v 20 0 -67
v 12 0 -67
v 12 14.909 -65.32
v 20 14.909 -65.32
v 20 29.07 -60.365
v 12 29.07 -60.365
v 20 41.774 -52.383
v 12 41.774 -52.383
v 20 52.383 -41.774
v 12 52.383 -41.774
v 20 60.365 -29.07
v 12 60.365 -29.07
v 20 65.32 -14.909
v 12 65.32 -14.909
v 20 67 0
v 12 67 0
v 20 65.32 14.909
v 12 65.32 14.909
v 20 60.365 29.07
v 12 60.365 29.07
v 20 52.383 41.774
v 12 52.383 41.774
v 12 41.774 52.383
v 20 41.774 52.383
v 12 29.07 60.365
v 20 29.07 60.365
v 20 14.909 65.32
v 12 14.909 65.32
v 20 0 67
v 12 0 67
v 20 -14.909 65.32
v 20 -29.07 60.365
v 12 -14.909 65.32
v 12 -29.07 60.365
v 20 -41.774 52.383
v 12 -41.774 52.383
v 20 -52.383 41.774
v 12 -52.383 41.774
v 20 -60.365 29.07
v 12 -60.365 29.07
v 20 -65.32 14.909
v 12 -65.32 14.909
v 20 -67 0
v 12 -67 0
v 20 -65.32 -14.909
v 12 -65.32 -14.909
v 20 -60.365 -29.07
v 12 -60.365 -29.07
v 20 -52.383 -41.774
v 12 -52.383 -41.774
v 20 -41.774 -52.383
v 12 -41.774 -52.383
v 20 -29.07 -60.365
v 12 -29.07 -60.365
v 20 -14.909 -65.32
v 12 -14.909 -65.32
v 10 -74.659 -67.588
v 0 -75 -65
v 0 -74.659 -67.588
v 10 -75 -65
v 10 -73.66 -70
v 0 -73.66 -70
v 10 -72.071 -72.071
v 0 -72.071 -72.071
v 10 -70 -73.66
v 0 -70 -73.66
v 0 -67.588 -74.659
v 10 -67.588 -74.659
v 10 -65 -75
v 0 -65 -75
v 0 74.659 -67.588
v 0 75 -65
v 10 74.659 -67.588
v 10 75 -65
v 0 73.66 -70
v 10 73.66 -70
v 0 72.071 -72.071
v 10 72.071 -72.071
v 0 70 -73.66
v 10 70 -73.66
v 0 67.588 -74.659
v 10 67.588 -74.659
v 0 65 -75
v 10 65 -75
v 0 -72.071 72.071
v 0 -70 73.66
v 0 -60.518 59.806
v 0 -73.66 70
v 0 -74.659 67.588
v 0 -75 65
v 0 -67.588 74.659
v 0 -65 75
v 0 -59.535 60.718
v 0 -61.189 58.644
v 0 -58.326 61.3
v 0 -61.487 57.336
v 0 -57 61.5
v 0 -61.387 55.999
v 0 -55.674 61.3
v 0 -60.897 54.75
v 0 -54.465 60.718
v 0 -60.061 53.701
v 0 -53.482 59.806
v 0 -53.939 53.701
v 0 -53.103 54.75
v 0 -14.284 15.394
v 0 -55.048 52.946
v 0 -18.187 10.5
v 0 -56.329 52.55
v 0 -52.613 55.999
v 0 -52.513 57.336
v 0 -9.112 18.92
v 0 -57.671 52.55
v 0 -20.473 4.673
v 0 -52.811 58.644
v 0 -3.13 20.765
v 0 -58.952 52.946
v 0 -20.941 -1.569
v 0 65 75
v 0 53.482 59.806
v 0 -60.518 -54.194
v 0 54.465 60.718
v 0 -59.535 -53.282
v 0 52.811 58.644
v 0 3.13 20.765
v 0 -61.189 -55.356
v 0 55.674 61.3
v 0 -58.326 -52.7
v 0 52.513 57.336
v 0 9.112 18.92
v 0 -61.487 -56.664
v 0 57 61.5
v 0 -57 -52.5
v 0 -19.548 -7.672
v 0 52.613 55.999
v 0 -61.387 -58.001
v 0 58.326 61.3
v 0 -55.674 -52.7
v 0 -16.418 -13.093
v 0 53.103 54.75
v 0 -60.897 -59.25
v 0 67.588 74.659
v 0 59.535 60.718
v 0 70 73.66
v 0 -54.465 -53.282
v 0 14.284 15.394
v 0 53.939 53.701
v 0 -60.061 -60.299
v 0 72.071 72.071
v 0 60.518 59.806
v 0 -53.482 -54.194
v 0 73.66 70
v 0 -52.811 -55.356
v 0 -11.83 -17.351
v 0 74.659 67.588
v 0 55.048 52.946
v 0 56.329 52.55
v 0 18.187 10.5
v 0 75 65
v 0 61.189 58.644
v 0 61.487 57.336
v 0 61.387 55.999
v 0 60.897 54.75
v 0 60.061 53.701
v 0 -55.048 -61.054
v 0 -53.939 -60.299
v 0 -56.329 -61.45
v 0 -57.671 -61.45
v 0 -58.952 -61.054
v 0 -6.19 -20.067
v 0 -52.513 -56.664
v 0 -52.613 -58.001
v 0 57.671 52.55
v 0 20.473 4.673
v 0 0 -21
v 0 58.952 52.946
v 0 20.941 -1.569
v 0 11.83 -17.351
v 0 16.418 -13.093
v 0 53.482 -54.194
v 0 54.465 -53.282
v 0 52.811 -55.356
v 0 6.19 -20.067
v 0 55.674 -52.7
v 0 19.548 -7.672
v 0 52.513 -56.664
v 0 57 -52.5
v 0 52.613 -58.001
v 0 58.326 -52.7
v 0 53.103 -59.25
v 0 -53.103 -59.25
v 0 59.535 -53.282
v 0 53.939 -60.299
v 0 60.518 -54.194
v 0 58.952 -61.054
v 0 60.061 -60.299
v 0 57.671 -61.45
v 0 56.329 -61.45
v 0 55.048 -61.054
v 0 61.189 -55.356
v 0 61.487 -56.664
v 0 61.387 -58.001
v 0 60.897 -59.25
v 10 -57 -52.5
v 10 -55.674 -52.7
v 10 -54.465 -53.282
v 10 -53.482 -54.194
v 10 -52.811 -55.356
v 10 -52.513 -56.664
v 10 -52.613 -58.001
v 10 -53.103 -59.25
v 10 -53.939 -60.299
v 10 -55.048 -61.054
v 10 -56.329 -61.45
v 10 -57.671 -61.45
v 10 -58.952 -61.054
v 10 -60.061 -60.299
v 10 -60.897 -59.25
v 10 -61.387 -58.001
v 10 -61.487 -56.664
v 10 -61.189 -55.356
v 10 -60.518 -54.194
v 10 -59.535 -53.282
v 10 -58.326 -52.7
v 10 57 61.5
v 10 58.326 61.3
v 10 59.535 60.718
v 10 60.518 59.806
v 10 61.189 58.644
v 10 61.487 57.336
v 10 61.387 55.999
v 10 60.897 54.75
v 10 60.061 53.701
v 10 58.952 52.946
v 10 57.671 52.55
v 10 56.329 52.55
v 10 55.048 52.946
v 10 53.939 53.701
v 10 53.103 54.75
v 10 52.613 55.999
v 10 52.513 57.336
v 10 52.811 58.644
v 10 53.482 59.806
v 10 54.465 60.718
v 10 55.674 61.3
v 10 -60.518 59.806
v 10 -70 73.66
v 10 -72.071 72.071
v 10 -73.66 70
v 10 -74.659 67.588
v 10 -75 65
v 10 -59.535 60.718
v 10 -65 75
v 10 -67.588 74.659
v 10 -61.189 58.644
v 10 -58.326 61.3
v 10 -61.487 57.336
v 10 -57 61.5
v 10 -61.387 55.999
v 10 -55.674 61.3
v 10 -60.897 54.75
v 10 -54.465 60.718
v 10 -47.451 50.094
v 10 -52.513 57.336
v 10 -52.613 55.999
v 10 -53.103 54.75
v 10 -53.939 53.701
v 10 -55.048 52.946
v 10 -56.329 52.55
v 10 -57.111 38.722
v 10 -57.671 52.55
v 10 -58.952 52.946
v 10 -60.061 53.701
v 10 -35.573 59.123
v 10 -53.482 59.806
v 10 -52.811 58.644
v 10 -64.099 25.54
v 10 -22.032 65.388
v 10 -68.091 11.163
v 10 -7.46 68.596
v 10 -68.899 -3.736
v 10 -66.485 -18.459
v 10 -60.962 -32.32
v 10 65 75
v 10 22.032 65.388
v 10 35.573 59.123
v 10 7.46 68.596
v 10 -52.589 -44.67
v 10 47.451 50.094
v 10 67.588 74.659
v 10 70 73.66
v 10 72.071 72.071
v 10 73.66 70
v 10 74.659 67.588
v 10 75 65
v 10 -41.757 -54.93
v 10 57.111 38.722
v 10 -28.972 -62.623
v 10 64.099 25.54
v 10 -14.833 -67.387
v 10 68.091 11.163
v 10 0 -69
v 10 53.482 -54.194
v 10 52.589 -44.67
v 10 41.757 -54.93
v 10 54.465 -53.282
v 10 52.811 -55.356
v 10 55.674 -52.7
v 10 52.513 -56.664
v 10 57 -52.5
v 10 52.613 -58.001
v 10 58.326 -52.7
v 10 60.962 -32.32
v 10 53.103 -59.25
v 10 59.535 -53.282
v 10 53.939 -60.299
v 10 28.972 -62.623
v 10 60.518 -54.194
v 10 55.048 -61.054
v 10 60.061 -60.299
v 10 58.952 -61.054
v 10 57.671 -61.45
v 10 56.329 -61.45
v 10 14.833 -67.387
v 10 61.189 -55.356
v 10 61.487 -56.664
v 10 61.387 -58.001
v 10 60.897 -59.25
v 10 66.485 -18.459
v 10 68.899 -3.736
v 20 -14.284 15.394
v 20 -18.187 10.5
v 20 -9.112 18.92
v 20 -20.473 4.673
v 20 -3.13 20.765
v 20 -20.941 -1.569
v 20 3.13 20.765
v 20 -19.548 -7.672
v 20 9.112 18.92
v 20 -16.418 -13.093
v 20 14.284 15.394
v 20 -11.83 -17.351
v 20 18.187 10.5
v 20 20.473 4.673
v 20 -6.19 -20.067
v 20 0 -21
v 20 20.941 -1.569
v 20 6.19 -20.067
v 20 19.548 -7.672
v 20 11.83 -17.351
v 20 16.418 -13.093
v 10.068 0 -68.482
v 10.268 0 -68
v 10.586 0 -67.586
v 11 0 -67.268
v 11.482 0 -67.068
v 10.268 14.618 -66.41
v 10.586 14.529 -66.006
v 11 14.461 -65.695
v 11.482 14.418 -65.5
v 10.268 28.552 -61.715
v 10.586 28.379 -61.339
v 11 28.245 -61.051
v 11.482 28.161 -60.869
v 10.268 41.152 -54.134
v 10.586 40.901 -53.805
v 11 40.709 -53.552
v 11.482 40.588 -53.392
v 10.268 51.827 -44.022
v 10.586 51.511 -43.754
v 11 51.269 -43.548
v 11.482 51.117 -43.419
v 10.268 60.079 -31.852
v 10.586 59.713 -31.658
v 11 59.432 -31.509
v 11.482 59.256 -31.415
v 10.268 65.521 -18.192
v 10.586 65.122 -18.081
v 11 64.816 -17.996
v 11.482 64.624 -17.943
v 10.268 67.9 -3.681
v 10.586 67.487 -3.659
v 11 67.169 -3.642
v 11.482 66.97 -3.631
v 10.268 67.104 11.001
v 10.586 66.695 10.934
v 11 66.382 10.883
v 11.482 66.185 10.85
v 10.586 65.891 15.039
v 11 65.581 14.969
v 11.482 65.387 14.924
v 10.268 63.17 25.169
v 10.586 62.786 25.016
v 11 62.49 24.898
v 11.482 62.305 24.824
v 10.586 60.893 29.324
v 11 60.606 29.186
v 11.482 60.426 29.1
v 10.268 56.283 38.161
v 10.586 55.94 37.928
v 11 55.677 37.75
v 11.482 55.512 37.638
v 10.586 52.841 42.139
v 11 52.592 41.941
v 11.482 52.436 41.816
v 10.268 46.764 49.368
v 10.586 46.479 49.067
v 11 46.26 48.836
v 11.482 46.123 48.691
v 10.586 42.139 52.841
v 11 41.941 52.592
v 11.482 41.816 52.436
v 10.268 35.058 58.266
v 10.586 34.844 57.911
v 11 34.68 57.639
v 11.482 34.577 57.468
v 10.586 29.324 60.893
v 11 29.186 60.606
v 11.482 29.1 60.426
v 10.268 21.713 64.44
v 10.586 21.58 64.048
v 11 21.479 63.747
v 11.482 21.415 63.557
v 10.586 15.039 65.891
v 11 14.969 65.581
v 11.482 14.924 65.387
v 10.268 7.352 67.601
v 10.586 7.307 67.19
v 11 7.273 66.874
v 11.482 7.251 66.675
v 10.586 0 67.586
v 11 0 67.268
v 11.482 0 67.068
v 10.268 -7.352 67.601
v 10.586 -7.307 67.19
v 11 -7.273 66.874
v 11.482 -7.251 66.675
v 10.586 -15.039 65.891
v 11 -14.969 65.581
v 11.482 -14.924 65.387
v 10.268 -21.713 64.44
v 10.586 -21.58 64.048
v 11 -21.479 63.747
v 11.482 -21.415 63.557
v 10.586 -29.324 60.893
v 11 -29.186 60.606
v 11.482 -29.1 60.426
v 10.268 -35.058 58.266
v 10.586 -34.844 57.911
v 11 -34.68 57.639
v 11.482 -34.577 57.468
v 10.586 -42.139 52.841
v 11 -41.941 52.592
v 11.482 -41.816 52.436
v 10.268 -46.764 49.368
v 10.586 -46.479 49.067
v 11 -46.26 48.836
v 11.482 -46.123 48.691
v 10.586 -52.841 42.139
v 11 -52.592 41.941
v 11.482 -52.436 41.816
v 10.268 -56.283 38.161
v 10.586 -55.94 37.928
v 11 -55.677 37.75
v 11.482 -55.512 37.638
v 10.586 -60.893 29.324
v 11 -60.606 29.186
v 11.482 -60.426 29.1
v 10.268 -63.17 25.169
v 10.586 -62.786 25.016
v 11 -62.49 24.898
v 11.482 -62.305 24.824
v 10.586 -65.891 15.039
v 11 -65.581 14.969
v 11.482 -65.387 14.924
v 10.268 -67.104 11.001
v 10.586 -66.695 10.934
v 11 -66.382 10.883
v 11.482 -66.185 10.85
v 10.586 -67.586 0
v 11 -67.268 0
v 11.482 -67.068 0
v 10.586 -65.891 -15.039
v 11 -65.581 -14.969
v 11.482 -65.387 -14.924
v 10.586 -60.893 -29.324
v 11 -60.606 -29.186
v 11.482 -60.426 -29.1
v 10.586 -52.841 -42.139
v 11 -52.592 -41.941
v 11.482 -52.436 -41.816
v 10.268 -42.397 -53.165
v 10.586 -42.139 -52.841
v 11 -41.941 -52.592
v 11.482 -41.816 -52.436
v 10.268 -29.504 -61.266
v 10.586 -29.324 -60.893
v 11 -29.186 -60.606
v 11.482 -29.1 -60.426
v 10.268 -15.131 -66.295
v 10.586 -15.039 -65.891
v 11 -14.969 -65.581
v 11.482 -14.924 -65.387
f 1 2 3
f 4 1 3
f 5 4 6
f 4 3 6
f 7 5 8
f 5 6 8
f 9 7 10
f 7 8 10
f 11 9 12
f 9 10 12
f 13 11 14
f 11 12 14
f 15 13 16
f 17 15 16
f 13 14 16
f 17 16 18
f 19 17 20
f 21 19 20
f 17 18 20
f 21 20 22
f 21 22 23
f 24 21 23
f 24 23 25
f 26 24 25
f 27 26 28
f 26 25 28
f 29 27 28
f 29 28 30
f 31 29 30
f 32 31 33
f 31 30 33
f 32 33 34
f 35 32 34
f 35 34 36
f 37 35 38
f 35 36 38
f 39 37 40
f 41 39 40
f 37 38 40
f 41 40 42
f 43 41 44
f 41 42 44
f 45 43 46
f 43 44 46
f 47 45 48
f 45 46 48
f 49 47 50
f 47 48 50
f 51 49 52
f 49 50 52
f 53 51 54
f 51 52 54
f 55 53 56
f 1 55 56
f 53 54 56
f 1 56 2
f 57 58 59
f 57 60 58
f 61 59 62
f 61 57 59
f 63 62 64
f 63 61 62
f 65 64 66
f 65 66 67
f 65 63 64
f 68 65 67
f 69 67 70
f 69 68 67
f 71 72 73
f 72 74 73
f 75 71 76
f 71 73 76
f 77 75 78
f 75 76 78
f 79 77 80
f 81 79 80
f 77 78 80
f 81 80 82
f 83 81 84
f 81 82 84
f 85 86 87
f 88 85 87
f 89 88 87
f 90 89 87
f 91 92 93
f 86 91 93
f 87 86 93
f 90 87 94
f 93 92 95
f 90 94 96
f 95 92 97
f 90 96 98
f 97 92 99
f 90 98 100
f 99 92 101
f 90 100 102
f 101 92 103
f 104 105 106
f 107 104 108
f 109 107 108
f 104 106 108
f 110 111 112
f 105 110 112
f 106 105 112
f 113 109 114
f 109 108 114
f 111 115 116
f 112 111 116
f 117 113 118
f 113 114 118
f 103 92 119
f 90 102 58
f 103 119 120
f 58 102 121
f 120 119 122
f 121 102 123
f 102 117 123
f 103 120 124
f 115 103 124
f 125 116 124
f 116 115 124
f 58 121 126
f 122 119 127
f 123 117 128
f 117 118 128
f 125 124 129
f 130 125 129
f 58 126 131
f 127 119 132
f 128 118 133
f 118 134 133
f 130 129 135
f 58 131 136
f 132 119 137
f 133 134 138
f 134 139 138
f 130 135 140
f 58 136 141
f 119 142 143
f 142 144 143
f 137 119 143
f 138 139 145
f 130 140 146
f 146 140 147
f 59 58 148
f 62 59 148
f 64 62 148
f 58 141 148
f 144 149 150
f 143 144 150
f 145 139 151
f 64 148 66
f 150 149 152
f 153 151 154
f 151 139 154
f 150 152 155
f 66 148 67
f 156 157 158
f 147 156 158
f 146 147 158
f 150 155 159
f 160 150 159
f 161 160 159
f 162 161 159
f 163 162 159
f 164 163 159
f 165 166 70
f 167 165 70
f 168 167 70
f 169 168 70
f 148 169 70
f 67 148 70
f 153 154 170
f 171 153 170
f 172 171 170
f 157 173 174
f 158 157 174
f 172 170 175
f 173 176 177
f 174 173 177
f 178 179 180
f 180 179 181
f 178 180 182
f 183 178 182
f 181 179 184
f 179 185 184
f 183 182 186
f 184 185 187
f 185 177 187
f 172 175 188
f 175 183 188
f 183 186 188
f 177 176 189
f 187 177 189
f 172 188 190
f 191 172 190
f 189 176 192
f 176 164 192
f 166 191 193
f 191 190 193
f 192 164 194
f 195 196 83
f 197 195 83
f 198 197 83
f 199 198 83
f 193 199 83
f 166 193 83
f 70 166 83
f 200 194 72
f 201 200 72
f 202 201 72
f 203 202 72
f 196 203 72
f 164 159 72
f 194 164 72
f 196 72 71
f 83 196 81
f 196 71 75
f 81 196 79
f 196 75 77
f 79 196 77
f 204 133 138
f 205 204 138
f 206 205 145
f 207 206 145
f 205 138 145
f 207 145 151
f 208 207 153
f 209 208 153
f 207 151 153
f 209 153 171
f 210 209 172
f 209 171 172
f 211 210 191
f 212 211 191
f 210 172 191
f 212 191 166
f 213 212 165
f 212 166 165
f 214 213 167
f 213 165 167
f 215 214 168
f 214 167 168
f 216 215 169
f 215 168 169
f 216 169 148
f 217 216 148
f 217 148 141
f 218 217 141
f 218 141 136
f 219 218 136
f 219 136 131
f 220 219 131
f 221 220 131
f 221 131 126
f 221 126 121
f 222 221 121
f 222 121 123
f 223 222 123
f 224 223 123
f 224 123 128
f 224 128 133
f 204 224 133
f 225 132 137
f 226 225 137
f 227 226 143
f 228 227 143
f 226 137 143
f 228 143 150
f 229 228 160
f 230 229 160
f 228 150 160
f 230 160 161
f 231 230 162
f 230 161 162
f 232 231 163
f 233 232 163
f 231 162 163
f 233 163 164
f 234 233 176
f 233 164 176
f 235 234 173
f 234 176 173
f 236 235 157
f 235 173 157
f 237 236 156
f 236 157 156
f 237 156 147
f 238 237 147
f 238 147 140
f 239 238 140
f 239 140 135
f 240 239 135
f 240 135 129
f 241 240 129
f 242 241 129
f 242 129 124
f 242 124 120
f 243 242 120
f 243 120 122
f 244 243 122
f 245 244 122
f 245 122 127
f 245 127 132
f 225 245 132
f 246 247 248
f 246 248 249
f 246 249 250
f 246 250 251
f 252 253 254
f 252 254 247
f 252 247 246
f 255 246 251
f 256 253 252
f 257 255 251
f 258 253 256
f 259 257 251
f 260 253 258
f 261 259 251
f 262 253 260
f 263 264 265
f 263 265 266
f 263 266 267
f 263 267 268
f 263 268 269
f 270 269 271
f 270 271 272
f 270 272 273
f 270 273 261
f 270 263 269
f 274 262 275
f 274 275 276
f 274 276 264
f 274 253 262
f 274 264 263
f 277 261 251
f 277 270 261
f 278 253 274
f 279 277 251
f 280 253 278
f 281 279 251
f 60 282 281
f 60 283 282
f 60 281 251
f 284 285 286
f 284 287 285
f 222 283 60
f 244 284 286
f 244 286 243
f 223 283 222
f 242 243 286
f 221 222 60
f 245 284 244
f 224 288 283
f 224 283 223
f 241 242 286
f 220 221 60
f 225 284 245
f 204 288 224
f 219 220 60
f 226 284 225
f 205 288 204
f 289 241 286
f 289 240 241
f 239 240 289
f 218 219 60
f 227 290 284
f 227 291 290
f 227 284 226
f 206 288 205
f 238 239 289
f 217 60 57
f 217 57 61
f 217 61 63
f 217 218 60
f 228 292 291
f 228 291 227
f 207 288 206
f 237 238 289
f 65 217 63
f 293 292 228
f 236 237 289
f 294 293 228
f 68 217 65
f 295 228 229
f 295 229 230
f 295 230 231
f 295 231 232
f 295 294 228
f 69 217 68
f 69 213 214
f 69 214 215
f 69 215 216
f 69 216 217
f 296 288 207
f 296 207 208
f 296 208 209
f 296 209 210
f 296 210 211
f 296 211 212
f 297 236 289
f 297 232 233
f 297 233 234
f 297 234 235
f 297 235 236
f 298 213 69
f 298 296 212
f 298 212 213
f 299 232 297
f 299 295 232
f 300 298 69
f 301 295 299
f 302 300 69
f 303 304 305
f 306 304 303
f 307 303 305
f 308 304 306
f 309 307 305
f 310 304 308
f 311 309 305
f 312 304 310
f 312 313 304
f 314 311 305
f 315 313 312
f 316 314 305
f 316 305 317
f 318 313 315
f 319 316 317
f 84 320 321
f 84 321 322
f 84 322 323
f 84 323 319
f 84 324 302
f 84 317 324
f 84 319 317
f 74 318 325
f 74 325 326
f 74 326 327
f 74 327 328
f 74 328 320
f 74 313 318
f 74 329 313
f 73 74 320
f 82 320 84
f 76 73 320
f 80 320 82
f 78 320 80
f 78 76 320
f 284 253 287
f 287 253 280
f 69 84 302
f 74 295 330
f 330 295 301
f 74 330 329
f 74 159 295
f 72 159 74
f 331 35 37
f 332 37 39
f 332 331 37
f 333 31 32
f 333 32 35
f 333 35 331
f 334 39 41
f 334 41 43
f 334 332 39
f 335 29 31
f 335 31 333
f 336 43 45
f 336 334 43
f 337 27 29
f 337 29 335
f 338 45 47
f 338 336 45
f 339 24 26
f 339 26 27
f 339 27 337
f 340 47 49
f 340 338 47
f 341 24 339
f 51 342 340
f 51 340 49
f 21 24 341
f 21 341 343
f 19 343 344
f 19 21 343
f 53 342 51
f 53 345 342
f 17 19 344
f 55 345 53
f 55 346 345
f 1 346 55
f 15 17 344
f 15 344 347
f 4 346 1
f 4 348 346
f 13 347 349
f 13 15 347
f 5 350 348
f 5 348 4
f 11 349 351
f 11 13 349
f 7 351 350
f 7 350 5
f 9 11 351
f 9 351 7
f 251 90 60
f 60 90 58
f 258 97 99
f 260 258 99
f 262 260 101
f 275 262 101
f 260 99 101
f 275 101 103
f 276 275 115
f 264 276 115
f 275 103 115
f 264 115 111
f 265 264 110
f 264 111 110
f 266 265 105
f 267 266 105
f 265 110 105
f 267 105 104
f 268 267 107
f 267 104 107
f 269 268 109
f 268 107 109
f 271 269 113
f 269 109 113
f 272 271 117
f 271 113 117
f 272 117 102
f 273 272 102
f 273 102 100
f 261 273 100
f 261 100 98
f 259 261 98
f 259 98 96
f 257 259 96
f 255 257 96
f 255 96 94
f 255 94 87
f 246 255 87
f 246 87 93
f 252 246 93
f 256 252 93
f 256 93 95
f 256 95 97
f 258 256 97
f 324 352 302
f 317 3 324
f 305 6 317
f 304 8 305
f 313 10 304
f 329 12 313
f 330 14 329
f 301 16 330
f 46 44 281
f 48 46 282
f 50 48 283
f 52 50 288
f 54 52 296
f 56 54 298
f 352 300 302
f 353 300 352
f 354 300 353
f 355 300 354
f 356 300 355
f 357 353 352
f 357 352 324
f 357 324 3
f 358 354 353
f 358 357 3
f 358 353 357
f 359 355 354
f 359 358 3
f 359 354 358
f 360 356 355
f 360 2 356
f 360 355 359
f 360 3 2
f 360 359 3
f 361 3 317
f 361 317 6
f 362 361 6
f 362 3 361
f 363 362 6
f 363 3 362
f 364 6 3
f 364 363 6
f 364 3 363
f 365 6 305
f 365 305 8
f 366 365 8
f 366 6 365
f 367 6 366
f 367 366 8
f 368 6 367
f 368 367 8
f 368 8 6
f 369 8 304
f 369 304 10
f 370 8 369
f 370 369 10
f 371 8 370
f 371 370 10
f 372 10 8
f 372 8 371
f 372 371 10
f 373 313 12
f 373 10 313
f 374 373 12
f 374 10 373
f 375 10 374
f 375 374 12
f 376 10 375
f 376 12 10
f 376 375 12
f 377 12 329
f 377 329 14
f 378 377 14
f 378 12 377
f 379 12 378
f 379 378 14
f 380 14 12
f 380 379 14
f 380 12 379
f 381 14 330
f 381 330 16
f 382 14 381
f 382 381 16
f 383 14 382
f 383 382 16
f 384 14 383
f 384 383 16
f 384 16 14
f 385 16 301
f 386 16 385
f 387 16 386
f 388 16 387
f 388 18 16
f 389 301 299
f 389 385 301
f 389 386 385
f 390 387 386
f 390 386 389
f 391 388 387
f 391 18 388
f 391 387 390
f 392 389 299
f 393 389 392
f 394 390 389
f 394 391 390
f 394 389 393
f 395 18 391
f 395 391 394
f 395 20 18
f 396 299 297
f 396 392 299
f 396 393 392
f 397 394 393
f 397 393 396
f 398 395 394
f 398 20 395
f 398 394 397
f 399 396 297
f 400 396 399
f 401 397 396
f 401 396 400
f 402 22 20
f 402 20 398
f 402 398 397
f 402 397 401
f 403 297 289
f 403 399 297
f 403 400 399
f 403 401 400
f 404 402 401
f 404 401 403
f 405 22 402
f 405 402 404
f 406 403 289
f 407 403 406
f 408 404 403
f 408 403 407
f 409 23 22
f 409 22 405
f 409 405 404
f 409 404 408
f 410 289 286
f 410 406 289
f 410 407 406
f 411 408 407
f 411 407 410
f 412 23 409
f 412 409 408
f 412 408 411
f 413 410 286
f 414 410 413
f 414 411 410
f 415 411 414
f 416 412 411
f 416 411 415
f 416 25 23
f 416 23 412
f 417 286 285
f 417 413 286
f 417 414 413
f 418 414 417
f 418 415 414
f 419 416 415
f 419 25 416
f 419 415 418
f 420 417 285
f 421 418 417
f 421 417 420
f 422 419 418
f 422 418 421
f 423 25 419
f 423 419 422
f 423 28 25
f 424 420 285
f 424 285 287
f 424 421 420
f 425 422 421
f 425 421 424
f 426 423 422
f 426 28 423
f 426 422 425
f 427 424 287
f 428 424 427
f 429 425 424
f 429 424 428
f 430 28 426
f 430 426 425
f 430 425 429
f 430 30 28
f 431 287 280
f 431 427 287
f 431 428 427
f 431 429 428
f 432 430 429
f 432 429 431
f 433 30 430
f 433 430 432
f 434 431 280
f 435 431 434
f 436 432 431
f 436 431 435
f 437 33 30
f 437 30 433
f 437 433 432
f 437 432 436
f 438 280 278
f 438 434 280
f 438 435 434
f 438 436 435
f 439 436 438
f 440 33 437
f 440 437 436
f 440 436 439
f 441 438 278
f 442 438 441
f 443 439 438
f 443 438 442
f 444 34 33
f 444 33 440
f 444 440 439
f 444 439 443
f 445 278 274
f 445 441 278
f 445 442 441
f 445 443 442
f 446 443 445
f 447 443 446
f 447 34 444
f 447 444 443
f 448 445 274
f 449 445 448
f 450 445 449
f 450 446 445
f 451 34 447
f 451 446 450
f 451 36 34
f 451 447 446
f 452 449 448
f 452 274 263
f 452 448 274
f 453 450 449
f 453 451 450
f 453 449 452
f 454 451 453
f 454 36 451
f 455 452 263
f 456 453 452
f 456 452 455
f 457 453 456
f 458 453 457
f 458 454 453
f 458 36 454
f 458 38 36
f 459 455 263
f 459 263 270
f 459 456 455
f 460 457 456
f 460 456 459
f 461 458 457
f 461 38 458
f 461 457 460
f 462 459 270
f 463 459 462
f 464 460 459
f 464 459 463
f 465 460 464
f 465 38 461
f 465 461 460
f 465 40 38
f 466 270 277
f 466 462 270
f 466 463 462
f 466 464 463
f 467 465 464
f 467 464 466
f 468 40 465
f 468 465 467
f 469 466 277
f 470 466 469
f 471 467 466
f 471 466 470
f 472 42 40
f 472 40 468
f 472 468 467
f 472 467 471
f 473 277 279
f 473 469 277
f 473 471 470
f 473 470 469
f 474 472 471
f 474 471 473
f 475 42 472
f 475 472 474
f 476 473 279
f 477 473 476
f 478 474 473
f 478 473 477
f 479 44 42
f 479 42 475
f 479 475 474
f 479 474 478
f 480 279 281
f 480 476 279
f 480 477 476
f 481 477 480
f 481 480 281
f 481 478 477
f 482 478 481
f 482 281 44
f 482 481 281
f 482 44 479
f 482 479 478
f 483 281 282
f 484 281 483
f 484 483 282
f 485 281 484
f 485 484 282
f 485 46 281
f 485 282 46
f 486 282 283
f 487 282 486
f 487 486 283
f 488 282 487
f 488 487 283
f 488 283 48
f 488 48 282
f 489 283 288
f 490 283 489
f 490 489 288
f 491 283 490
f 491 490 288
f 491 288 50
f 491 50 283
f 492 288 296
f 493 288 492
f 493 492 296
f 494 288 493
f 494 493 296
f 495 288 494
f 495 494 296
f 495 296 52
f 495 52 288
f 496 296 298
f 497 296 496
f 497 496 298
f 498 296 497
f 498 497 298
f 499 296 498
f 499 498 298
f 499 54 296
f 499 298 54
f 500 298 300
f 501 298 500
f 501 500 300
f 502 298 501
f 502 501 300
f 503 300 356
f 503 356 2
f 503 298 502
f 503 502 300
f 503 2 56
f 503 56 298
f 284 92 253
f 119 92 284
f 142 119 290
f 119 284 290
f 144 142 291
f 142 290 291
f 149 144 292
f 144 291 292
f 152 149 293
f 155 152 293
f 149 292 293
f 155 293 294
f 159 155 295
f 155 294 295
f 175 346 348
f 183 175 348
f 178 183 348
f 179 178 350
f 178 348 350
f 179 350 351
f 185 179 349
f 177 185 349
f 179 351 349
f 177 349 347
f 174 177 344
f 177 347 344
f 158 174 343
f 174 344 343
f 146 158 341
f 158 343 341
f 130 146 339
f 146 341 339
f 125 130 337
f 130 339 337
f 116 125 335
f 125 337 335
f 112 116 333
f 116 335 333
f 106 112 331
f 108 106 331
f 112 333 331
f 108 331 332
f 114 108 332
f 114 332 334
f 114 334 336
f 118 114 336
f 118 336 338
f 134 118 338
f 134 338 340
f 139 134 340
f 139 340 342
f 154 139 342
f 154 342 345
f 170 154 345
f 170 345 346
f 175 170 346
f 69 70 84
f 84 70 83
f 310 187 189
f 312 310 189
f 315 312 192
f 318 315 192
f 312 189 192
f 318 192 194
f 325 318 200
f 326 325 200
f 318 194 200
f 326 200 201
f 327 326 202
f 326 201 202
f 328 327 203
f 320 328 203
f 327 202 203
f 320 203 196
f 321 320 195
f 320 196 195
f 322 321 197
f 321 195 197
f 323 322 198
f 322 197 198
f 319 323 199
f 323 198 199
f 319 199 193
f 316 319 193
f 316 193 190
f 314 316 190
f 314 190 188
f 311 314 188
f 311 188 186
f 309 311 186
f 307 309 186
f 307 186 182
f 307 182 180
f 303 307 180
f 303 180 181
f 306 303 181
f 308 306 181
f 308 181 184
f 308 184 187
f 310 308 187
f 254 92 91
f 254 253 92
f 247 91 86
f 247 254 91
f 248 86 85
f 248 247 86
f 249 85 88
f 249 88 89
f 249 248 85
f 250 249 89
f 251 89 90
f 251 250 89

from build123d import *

# Parameters (mm, degrees)
CROQUIS1_W                   = 150
CROQUIS1_H                   = 150
SALIENTE_EXTRUIR1_DEPTH      = 10
CROQUIS2_R                   = 67
SALIENTE_EXTRUIR2_DEPTH      = 10
REDONDEO1_R                  = 10
REDONDEO2_R                  = 2
CROQUIS3_R                   = 21
CORTAR_EXTRUIR1_DEPTH        = 108.935165725
TALADRO_DE_MARGEN_PARA_M81_D = 9
TALADRO_DE_MARGEN_PARA_M82_D = 9


with BuildPart() as part:
    # Croquis1 → Saliente-Extruir1 (new body)
    with BuildSketch(Plane(origin=(0, 0, 0), x_dir=(0, 0, -1), z_dir=(1, 0, 0))):
        Rectangle(CROQUIS1_W, CROQUIS1_H)
    extrude(amount=SALIENTE_EXTRUIR1_DEPTH)

    # Croquis2 → Saliente-Extruir2 (add)
    with BuildSketch(Plane(origin=(10, 0, 0), x_dir=(0, 0, -1), z_dir=(1, 0, 0))):
        Circle(CROQUIS2_R)
    extrude(amount=SALIENTE_EXTRUIR2_DEPTH)

    # Redondeo1
    redondeo1_edges = [part.edges().sort_by_distance(p)[0] for p in [
        (5, -75, -75),
        (5, -75, 75),
        (5, 75, 75),
        (5, 75, -75),
    ]]
    fillet(redondeo1_edges, radius=REDONDEO1_R)

    # Redondeo2
    redondeo2_edges = [part.edges().sort_by_distance(p)[0] for p in [
        (10, 0, 67),
    ]]
    fillet(redondeo2_edges, radius=REDONDEO2_R)

    # Croquis3 → Cortar-Extruir1 (cut, through all)
    with BuildSketch(Plane(origin=(20, 0, 0), x_dir=(0, 0, -1), z_dir=(1, 0, 0))):
        Circle(CROQUIS3_R)
    extrude(amount=-CORTAR_EXTRUIR1_DEPTH, mode=Mode.SUBTRACT)

    # Taladro de margen para M81 (through all)
    with Locations(Plane(origin=(10, -7.41730184, 252.760845032), x_dir=(0, 0, -1), z_dir=(1, 0, 0))):
        with Locations((195.760845032, 64.41730184), (309.760845032, 64.41730184)):
            Hole(TALADRO_DE_MARGEN_PARA_M81_D / 2)

    # Taladro de margen para M82 (through all)
    with Locations(Plane(origin=(10, -7.41730184, 252.760845032), x_dir=(0, 0, -1), z_dir=(1, 0, 0))):
        with Locations((309.760845032, -49.58269816), (195.760845032, -49.58269816)):
            Hole(TALADRO_DE_MARGEN_PARA_M82_D / 2)


solid = part.part
